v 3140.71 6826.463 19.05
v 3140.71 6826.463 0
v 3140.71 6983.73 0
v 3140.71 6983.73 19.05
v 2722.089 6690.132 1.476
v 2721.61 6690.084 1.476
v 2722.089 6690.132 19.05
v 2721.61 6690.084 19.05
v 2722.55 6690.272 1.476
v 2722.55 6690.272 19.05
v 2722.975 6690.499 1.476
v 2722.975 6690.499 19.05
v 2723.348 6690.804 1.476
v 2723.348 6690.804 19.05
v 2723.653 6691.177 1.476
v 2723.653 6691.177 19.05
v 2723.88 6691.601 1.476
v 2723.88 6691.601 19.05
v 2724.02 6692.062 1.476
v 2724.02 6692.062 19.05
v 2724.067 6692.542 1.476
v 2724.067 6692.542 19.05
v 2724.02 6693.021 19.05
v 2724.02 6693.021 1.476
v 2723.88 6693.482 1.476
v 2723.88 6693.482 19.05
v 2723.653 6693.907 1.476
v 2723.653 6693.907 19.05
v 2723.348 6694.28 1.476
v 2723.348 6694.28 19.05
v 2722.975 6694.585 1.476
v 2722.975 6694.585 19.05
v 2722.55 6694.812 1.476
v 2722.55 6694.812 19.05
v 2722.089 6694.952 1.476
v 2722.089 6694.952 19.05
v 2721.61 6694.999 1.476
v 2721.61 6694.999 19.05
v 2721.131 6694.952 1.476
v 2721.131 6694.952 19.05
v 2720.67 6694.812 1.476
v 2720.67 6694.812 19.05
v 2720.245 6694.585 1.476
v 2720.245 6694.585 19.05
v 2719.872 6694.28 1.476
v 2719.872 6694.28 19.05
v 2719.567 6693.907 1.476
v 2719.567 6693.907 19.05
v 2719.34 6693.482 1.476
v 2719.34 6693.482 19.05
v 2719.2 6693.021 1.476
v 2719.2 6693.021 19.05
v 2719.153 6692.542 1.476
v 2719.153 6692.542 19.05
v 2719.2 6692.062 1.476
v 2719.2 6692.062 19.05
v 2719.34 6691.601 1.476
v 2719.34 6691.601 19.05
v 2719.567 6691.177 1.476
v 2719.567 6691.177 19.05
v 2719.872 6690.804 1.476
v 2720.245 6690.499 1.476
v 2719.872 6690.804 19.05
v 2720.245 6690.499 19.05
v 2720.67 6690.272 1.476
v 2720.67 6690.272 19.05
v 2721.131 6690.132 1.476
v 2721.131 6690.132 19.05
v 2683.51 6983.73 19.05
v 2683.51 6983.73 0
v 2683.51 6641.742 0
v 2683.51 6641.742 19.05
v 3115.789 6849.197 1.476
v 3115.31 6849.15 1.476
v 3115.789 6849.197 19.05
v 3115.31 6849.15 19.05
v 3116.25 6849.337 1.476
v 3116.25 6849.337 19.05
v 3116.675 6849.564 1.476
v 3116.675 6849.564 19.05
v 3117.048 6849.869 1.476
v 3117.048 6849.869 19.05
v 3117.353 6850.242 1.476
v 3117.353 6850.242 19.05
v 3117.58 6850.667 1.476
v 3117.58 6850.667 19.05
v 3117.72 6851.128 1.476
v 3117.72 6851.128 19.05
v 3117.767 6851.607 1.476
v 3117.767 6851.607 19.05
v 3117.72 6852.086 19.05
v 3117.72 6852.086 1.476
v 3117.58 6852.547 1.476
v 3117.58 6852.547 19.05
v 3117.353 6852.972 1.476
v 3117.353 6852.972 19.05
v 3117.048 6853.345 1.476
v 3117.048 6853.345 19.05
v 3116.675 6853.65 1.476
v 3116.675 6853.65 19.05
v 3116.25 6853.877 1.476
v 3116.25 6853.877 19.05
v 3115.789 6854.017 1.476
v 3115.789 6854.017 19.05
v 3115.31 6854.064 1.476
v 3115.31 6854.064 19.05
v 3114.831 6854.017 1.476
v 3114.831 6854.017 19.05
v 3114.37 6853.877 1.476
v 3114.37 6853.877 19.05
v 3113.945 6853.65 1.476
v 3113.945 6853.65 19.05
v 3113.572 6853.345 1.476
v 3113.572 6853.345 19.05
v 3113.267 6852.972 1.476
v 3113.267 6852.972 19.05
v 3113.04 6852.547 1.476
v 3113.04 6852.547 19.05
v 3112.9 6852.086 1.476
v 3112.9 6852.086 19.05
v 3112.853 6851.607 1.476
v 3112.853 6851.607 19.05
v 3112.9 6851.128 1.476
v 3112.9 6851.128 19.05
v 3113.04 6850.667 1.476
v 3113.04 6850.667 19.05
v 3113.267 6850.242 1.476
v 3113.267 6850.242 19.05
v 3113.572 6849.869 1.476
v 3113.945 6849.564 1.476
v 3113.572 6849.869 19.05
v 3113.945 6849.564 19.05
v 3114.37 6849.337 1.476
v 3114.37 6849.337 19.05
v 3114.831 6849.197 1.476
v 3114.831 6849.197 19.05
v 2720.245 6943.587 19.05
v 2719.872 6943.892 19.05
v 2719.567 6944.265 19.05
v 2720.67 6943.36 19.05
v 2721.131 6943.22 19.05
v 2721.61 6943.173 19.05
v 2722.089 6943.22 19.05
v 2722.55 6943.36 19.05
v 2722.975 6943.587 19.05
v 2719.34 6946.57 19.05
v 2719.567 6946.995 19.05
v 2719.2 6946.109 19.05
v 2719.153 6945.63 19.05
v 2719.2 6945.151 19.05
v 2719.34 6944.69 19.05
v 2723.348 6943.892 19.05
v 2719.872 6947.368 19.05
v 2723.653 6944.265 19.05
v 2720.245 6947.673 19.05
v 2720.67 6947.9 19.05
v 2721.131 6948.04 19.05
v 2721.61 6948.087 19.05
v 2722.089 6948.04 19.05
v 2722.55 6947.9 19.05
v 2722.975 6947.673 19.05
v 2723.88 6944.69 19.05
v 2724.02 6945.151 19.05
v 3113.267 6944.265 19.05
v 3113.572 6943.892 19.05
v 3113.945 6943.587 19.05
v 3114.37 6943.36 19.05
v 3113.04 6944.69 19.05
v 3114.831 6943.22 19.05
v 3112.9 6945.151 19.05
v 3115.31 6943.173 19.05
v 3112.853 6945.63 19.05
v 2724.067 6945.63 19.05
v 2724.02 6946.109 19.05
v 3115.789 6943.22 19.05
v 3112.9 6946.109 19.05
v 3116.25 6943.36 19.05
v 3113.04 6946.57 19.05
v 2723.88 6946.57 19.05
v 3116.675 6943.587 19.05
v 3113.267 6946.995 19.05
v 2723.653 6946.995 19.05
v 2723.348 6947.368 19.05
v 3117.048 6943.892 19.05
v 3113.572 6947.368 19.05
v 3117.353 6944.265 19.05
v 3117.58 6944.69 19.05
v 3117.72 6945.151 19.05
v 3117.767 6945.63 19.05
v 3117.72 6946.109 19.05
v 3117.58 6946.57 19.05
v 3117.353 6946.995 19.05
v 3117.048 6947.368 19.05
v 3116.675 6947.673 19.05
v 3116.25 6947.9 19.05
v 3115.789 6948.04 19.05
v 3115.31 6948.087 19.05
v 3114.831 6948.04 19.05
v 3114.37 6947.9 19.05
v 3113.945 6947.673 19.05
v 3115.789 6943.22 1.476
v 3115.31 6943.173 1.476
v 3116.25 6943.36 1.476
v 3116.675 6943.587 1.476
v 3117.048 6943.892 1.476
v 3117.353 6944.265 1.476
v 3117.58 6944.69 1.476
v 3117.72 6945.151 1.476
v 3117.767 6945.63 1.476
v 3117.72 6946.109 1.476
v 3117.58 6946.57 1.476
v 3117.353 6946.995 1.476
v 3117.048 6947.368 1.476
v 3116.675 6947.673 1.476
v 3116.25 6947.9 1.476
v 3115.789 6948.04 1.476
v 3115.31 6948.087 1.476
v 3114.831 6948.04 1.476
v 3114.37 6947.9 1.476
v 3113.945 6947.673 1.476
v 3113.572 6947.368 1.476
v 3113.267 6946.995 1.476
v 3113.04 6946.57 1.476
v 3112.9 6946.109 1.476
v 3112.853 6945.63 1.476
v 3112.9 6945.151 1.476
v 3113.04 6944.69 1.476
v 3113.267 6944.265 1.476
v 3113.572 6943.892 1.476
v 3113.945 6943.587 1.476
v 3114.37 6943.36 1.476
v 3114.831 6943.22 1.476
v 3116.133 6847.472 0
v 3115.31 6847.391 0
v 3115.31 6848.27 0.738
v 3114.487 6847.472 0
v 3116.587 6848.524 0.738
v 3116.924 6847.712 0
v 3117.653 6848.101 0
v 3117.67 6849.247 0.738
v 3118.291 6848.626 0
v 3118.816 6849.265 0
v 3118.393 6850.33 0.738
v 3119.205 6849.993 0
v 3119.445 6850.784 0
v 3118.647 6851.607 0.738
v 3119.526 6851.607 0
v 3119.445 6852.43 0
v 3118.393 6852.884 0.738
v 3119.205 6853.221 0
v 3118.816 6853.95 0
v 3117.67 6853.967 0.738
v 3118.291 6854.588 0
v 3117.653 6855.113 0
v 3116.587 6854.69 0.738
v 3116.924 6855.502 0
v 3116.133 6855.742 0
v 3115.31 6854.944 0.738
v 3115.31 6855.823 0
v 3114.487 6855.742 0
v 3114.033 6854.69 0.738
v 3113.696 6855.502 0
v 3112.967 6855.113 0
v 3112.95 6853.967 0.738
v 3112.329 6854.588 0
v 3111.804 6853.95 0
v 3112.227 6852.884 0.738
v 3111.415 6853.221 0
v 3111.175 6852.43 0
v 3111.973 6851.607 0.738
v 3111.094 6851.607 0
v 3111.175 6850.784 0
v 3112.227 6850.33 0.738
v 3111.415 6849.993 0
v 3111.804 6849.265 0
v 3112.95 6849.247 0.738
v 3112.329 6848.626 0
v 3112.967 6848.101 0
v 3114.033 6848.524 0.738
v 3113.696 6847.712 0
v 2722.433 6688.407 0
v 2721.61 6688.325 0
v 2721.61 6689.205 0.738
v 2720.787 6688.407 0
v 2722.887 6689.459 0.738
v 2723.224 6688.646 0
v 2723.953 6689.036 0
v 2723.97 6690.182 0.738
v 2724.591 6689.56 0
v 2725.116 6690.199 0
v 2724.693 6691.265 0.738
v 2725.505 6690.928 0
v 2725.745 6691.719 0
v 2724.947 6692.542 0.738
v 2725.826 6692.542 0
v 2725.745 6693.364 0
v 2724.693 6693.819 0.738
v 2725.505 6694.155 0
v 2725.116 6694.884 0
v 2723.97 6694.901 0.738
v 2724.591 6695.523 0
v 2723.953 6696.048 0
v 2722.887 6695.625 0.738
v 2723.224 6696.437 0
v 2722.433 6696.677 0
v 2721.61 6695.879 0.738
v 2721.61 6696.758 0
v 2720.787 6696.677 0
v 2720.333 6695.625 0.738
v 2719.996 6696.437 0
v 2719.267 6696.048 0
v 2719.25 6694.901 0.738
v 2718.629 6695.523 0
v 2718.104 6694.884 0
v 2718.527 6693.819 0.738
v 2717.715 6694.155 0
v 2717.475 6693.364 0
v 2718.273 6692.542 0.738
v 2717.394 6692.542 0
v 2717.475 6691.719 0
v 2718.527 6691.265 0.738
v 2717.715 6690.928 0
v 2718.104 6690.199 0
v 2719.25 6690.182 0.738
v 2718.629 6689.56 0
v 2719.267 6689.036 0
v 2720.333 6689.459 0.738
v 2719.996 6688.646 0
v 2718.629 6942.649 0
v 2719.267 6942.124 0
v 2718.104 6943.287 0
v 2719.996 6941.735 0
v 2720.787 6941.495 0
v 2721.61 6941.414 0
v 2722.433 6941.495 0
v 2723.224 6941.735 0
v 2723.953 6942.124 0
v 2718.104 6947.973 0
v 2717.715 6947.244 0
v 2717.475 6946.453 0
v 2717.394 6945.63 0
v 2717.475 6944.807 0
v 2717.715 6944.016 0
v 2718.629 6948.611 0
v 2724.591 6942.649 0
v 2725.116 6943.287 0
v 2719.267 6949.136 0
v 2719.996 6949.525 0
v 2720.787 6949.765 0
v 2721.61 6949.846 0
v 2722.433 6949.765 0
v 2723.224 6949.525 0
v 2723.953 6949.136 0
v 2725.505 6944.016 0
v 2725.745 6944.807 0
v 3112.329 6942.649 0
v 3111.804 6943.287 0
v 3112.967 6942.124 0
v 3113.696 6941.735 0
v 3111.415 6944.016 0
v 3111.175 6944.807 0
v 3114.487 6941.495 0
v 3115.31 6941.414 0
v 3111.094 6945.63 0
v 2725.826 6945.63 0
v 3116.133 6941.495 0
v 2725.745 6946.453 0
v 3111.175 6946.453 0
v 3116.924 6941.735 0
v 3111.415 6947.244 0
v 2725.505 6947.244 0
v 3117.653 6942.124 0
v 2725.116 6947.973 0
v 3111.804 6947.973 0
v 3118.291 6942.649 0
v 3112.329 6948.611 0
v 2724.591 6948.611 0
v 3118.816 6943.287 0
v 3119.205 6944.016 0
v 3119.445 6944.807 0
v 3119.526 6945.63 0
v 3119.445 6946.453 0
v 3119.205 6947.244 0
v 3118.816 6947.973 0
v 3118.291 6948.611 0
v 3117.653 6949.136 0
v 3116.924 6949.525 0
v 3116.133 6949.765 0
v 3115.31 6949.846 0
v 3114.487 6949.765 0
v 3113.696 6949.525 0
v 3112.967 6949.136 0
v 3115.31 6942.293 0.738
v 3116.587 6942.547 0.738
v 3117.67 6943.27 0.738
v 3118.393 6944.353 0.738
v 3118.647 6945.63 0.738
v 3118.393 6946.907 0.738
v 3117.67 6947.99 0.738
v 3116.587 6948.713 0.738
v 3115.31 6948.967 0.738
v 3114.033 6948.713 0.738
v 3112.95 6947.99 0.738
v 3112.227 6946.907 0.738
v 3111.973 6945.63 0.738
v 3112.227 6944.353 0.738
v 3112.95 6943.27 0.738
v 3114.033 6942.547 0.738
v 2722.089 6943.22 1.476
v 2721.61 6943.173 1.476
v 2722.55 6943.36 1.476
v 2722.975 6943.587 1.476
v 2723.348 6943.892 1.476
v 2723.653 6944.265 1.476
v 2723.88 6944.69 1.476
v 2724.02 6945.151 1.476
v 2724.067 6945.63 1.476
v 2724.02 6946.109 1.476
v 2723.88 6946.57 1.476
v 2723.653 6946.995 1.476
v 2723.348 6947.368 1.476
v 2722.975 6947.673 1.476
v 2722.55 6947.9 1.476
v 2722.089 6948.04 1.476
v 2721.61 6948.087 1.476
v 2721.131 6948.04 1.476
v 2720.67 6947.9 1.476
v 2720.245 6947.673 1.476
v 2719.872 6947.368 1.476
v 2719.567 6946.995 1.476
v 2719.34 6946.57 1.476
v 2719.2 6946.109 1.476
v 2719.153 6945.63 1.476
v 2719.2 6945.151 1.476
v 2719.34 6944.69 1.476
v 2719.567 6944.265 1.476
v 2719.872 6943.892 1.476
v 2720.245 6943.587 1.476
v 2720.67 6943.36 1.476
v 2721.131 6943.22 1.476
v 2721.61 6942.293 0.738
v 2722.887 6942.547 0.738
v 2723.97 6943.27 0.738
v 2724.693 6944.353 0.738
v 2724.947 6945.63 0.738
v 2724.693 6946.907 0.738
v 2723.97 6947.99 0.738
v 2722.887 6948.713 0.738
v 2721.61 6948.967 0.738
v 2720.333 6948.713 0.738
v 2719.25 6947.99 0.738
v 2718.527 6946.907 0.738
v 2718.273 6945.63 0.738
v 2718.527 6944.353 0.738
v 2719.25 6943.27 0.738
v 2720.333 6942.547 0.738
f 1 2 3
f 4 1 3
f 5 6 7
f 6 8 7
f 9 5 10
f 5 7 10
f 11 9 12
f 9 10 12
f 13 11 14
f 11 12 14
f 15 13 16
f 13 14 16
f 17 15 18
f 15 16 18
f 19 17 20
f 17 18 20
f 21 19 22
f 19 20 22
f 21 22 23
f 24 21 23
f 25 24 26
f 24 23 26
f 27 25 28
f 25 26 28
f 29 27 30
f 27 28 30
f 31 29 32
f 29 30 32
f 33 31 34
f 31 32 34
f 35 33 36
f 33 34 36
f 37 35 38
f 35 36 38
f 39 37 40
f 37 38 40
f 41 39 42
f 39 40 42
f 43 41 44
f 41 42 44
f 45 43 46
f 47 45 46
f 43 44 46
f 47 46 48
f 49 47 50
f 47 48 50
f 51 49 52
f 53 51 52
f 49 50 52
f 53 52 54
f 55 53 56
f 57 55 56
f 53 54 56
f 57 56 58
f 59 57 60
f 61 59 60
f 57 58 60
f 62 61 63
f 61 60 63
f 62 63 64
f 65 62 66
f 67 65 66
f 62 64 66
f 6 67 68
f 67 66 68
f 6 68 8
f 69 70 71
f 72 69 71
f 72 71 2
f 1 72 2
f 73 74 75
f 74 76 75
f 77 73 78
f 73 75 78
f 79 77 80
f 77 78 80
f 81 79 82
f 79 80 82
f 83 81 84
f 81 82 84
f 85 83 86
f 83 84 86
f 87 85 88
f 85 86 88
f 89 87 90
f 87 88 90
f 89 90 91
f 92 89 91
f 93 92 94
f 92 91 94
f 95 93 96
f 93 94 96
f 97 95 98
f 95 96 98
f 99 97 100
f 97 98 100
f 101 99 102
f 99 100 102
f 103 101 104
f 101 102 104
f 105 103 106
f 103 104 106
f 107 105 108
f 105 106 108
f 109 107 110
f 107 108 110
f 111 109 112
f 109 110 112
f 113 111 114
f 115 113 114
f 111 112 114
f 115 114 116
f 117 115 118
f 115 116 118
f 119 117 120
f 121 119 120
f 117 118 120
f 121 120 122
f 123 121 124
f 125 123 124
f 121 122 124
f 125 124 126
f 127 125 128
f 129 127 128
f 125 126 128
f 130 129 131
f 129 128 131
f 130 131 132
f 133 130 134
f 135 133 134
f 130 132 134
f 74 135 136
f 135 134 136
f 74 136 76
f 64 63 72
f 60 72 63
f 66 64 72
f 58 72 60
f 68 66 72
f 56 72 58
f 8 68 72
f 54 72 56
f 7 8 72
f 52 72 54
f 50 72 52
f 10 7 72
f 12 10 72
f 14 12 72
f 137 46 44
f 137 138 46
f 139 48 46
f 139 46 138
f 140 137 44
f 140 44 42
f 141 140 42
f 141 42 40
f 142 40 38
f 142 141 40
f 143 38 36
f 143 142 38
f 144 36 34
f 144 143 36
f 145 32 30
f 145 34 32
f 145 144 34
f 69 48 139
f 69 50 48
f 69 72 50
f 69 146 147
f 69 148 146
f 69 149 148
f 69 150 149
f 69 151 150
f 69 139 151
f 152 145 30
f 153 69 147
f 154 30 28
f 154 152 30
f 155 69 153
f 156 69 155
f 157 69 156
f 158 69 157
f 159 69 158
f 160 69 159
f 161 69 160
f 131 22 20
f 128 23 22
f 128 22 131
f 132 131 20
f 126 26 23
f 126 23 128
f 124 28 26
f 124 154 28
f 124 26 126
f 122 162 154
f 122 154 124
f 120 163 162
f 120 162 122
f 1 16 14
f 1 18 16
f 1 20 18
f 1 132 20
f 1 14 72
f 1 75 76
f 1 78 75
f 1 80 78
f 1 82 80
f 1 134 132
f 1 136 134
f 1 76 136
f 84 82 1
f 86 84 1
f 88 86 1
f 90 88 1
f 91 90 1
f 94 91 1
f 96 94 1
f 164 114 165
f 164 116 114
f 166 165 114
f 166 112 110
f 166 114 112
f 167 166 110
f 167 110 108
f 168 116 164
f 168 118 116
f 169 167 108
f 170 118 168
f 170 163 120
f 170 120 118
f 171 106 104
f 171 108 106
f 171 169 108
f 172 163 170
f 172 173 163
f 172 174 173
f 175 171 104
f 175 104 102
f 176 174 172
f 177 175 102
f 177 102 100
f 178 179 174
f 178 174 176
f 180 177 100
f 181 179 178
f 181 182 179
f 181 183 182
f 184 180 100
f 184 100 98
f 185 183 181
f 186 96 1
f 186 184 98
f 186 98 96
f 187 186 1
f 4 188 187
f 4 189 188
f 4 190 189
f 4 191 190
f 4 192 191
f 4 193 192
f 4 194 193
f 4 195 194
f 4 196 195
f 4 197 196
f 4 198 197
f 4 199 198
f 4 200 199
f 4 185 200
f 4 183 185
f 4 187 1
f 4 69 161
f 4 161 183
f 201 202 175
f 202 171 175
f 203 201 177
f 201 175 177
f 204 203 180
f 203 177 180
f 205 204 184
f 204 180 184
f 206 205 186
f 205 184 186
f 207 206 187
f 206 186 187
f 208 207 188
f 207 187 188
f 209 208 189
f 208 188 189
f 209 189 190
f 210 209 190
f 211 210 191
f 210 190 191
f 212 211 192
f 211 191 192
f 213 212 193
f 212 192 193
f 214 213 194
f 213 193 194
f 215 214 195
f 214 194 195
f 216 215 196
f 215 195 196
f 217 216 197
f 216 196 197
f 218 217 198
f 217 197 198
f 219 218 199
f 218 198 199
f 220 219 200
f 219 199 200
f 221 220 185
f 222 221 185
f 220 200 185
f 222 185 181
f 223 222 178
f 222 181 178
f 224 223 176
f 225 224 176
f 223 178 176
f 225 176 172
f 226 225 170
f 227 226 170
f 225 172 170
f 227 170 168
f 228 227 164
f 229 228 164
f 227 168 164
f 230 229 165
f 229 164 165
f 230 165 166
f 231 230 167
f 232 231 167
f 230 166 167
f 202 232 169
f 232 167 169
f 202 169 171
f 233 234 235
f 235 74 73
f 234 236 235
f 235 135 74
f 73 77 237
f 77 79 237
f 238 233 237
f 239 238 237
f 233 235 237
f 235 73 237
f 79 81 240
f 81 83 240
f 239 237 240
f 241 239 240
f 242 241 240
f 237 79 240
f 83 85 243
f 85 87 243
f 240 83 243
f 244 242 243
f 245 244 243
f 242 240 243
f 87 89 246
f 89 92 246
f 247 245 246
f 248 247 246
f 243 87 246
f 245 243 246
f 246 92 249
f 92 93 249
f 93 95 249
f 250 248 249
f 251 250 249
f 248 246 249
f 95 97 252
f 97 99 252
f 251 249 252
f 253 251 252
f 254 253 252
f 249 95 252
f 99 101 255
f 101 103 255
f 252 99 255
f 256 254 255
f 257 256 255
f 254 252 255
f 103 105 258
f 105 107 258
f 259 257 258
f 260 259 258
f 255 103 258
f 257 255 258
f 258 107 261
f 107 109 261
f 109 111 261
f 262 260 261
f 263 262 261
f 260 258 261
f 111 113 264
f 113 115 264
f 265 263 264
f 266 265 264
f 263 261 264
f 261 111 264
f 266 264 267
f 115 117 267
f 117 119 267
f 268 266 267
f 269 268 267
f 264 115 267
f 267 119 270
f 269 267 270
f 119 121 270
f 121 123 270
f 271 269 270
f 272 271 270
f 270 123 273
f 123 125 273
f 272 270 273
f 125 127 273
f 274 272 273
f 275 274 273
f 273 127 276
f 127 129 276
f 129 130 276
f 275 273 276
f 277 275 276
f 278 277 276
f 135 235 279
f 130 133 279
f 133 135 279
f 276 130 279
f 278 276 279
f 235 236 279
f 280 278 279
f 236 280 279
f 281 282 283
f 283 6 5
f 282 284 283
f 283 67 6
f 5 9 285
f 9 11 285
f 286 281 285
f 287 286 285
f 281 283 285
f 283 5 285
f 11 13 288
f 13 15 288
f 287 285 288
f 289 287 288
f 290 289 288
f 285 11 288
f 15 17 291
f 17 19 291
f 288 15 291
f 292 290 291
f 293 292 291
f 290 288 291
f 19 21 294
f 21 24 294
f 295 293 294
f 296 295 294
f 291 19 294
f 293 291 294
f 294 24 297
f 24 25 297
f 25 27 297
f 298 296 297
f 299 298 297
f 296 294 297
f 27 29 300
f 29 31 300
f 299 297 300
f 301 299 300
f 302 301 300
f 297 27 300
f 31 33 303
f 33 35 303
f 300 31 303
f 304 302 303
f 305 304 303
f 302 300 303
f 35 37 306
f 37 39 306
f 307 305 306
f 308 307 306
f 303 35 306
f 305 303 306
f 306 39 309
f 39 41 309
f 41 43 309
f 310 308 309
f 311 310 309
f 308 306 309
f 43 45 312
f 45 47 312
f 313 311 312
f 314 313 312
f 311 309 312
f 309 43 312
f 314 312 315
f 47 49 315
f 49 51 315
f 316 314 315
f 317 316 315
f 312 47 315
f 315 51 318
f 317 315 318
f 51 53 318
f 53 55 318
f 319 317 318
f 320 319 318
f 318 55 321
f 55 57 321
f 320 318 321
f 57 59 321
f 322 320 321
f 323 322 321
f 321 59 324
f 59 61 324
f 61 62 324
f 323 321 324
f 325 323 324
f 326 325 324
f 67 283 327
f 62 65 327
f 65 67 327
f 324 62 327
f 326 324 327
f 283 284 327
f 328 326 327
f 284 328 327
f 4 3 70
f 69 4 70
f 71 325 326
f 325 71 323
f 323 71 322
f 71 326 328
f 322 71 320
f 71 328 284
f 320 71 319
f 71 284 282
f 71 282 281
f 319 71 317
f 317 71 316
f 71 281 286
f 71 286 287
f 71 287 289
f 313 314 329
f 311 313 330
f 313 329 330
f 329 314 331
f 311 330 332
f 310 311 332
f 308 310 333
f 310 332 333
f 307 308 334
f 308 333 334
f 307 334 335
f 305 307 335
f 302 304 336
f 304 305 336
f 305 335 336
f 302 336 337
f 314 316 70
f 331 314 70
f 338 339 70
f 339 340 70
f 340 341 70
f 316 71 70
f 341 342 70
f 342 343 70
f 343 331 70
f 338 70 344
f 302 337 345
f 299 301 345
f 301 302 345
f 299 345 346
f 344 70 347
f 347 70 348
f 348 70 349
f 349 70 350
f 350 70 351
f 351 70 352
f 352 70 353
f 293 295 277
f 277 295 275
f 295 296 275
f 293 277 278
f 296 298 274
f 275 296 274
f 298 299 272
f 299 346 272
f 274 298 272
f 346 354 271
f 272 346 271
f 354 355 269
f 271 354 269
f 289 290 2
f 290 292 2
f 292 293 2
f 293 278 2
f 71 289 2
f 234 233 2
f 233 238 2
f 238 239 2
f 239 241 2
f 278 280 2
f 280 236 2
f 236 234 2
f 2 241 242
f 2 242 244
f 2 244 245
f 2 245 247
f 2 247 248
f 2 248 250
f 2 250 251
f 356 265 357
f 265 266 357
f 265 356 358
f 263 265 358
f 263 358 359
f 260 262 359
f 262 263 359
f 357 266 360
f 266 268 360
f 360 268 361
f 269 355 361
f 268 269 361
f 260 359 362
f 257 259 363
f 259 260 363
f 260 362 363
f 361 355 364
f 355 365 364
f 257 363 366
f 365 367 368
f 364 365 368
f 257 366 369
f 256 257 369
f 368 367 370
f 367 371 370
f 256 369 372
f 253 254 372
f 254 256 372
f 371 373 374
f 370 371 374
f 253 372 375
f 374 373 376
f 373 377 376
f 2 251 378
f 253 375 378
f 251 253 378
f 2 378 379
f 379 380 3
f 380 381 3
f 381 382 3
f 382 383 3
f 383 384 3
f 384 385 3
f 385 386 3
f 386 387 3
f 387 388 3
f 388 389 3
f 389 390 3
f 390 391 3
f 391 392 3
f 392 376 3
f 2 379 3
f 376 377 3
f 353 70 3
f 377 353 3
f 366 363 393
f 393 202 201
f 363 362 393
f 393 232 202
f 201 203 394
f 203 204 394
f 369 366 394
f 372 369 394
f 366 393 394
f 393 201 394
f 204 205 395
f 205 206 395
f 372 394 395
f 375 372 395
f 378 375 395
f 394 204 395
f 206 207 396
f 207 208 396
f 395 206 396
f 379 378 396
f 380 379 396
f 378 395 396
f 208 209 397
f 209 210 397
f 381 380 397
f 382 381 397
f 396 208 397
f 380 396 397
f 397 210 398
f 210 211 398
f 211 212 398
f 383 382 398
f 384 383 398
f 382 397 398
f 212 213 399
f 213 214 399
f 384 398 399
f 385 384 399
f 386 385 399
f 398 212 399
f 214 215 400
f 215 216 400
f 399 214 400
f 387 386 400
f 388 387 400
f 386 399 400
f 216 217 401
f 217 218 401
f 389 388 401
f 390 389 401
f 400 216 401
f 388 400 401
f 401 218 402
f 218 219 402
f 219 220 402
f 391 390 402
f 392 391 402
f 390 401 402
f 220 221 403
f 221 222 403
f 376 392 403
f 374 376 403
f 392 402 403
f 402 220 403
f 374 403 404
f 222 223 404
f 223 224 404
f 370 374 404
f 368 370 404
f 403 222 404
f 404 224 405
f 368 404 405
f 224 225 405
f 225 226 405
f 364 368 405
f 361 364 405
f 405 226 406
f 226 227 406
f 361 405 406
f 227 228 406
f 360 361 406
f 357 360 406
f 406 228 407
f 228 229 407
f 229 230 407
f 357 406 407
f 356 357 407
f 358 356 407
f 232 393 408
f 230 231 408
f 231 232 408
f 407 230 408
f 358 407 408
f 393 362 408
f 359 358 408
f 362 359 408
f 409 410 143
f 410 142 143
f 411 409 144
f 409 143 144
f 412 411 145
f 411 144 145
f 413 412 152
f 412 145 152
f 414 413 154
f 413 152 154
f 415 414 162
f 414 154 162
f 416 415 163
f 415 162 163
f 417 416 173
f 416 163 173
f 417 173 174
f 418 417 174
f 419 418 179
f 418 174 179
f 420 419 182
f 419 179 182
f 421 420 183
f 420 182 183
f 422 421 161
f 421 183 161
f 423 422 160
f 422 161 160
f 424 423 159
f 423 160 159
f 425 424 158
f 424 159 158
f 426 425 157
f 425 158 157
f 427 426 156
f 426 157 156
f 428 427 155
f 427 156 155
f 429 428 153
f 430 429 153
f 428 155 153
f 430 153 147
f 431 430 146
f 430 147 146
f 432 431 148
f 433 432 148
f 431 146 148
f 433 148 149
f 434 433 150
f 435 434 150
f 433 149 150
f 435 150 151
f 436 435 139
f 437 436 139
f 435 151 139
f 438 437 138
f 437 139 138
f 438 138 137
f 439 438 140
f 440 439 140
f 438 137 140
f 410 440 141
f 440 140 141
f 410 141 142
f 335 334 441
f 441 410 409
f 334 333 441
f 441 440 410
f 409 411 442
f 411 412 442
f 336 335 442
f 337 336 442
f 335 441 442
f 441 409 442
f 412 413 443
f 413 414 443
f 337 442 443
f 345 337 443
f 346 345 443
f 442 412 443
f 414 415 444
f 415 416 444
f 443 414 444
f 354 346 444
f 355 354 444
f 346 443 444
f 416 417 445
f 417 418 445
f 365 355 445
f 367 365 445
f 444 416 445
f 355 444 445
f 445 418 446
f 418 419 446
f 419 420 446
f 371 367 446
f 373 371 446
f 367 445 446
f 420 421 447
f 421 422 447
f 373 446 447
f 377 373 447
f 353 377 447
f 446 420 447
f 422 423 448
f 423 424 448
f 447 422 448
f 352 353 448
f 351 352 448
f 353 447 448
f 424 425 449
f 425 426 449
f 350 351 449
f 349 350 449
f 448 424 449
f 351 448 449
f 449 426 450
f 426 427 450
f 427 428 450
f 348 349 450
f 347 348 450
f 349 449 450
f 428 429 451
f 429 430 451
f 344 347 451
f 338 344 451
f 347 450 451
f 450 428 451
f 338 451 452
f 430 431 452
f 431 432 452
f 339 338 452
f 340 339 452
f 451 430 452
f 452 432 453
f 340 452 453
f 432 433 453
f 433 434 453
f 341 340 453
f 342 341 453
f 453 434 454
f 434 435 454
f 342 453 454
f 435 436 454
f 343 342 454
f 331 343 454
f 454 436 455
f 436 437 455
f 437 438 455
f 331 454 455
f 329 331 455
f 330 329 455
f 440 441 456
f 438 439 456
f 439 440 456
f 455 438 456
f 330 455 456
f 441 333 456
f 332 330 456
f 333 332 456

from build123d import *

# Parameters (mm, degrees)
BOSS_EXTRUDE1_DEPTH                               = 19.05
CSK_FOR_8_FLAT_HEAD_MACHINE_SCREW_100_D           = 4.9149
CSK_FOR_8_FLAT_HEAD_MACHINE_SCREW_100_CSINK_D     = 8.4328
CSK_FOR_8_FLAT_HEAD_MACHINE_SCREW_100_CSINK_ANGLE = 100


with BuildPart() as part:
    # Sketch1 → Boss-Extrude1 (new body)
    with BuildSketch(Plane.XY):
        Polygon((2683.51, 6983.72999014), (2683.51, 6641.741886848), (3140.71, 6826.4626773), (3140.71, 6983.72999014), align=None)
    extrude(amount=BOSS_EXTRUDE1_DEPTH)

    # CSK for #8 Flat Head Machine Screw (100)1 (through all)
    with Locations(Plane.YX):
        with Locations((6692.541891629, 2721.610000001), (6945.629994921, 2721.610000001), (6945.629994921, 3115.310000001), (6851.60701674, 3115.310000001)):
            CounterSinkHole(CSK_FOR_8_FLAT_HEAD_MACHINE_SCREW_100_D / 2, CSK_FOR_8_FLAT_HEAD_MACHINE_SCREW_100_CSINK_D / 2, counter_sink_angle=CSK_FOR_8_FLAT_HEAD_MACHINE_SCREW_100_CSINK_ANGLE)


solid = part.part
